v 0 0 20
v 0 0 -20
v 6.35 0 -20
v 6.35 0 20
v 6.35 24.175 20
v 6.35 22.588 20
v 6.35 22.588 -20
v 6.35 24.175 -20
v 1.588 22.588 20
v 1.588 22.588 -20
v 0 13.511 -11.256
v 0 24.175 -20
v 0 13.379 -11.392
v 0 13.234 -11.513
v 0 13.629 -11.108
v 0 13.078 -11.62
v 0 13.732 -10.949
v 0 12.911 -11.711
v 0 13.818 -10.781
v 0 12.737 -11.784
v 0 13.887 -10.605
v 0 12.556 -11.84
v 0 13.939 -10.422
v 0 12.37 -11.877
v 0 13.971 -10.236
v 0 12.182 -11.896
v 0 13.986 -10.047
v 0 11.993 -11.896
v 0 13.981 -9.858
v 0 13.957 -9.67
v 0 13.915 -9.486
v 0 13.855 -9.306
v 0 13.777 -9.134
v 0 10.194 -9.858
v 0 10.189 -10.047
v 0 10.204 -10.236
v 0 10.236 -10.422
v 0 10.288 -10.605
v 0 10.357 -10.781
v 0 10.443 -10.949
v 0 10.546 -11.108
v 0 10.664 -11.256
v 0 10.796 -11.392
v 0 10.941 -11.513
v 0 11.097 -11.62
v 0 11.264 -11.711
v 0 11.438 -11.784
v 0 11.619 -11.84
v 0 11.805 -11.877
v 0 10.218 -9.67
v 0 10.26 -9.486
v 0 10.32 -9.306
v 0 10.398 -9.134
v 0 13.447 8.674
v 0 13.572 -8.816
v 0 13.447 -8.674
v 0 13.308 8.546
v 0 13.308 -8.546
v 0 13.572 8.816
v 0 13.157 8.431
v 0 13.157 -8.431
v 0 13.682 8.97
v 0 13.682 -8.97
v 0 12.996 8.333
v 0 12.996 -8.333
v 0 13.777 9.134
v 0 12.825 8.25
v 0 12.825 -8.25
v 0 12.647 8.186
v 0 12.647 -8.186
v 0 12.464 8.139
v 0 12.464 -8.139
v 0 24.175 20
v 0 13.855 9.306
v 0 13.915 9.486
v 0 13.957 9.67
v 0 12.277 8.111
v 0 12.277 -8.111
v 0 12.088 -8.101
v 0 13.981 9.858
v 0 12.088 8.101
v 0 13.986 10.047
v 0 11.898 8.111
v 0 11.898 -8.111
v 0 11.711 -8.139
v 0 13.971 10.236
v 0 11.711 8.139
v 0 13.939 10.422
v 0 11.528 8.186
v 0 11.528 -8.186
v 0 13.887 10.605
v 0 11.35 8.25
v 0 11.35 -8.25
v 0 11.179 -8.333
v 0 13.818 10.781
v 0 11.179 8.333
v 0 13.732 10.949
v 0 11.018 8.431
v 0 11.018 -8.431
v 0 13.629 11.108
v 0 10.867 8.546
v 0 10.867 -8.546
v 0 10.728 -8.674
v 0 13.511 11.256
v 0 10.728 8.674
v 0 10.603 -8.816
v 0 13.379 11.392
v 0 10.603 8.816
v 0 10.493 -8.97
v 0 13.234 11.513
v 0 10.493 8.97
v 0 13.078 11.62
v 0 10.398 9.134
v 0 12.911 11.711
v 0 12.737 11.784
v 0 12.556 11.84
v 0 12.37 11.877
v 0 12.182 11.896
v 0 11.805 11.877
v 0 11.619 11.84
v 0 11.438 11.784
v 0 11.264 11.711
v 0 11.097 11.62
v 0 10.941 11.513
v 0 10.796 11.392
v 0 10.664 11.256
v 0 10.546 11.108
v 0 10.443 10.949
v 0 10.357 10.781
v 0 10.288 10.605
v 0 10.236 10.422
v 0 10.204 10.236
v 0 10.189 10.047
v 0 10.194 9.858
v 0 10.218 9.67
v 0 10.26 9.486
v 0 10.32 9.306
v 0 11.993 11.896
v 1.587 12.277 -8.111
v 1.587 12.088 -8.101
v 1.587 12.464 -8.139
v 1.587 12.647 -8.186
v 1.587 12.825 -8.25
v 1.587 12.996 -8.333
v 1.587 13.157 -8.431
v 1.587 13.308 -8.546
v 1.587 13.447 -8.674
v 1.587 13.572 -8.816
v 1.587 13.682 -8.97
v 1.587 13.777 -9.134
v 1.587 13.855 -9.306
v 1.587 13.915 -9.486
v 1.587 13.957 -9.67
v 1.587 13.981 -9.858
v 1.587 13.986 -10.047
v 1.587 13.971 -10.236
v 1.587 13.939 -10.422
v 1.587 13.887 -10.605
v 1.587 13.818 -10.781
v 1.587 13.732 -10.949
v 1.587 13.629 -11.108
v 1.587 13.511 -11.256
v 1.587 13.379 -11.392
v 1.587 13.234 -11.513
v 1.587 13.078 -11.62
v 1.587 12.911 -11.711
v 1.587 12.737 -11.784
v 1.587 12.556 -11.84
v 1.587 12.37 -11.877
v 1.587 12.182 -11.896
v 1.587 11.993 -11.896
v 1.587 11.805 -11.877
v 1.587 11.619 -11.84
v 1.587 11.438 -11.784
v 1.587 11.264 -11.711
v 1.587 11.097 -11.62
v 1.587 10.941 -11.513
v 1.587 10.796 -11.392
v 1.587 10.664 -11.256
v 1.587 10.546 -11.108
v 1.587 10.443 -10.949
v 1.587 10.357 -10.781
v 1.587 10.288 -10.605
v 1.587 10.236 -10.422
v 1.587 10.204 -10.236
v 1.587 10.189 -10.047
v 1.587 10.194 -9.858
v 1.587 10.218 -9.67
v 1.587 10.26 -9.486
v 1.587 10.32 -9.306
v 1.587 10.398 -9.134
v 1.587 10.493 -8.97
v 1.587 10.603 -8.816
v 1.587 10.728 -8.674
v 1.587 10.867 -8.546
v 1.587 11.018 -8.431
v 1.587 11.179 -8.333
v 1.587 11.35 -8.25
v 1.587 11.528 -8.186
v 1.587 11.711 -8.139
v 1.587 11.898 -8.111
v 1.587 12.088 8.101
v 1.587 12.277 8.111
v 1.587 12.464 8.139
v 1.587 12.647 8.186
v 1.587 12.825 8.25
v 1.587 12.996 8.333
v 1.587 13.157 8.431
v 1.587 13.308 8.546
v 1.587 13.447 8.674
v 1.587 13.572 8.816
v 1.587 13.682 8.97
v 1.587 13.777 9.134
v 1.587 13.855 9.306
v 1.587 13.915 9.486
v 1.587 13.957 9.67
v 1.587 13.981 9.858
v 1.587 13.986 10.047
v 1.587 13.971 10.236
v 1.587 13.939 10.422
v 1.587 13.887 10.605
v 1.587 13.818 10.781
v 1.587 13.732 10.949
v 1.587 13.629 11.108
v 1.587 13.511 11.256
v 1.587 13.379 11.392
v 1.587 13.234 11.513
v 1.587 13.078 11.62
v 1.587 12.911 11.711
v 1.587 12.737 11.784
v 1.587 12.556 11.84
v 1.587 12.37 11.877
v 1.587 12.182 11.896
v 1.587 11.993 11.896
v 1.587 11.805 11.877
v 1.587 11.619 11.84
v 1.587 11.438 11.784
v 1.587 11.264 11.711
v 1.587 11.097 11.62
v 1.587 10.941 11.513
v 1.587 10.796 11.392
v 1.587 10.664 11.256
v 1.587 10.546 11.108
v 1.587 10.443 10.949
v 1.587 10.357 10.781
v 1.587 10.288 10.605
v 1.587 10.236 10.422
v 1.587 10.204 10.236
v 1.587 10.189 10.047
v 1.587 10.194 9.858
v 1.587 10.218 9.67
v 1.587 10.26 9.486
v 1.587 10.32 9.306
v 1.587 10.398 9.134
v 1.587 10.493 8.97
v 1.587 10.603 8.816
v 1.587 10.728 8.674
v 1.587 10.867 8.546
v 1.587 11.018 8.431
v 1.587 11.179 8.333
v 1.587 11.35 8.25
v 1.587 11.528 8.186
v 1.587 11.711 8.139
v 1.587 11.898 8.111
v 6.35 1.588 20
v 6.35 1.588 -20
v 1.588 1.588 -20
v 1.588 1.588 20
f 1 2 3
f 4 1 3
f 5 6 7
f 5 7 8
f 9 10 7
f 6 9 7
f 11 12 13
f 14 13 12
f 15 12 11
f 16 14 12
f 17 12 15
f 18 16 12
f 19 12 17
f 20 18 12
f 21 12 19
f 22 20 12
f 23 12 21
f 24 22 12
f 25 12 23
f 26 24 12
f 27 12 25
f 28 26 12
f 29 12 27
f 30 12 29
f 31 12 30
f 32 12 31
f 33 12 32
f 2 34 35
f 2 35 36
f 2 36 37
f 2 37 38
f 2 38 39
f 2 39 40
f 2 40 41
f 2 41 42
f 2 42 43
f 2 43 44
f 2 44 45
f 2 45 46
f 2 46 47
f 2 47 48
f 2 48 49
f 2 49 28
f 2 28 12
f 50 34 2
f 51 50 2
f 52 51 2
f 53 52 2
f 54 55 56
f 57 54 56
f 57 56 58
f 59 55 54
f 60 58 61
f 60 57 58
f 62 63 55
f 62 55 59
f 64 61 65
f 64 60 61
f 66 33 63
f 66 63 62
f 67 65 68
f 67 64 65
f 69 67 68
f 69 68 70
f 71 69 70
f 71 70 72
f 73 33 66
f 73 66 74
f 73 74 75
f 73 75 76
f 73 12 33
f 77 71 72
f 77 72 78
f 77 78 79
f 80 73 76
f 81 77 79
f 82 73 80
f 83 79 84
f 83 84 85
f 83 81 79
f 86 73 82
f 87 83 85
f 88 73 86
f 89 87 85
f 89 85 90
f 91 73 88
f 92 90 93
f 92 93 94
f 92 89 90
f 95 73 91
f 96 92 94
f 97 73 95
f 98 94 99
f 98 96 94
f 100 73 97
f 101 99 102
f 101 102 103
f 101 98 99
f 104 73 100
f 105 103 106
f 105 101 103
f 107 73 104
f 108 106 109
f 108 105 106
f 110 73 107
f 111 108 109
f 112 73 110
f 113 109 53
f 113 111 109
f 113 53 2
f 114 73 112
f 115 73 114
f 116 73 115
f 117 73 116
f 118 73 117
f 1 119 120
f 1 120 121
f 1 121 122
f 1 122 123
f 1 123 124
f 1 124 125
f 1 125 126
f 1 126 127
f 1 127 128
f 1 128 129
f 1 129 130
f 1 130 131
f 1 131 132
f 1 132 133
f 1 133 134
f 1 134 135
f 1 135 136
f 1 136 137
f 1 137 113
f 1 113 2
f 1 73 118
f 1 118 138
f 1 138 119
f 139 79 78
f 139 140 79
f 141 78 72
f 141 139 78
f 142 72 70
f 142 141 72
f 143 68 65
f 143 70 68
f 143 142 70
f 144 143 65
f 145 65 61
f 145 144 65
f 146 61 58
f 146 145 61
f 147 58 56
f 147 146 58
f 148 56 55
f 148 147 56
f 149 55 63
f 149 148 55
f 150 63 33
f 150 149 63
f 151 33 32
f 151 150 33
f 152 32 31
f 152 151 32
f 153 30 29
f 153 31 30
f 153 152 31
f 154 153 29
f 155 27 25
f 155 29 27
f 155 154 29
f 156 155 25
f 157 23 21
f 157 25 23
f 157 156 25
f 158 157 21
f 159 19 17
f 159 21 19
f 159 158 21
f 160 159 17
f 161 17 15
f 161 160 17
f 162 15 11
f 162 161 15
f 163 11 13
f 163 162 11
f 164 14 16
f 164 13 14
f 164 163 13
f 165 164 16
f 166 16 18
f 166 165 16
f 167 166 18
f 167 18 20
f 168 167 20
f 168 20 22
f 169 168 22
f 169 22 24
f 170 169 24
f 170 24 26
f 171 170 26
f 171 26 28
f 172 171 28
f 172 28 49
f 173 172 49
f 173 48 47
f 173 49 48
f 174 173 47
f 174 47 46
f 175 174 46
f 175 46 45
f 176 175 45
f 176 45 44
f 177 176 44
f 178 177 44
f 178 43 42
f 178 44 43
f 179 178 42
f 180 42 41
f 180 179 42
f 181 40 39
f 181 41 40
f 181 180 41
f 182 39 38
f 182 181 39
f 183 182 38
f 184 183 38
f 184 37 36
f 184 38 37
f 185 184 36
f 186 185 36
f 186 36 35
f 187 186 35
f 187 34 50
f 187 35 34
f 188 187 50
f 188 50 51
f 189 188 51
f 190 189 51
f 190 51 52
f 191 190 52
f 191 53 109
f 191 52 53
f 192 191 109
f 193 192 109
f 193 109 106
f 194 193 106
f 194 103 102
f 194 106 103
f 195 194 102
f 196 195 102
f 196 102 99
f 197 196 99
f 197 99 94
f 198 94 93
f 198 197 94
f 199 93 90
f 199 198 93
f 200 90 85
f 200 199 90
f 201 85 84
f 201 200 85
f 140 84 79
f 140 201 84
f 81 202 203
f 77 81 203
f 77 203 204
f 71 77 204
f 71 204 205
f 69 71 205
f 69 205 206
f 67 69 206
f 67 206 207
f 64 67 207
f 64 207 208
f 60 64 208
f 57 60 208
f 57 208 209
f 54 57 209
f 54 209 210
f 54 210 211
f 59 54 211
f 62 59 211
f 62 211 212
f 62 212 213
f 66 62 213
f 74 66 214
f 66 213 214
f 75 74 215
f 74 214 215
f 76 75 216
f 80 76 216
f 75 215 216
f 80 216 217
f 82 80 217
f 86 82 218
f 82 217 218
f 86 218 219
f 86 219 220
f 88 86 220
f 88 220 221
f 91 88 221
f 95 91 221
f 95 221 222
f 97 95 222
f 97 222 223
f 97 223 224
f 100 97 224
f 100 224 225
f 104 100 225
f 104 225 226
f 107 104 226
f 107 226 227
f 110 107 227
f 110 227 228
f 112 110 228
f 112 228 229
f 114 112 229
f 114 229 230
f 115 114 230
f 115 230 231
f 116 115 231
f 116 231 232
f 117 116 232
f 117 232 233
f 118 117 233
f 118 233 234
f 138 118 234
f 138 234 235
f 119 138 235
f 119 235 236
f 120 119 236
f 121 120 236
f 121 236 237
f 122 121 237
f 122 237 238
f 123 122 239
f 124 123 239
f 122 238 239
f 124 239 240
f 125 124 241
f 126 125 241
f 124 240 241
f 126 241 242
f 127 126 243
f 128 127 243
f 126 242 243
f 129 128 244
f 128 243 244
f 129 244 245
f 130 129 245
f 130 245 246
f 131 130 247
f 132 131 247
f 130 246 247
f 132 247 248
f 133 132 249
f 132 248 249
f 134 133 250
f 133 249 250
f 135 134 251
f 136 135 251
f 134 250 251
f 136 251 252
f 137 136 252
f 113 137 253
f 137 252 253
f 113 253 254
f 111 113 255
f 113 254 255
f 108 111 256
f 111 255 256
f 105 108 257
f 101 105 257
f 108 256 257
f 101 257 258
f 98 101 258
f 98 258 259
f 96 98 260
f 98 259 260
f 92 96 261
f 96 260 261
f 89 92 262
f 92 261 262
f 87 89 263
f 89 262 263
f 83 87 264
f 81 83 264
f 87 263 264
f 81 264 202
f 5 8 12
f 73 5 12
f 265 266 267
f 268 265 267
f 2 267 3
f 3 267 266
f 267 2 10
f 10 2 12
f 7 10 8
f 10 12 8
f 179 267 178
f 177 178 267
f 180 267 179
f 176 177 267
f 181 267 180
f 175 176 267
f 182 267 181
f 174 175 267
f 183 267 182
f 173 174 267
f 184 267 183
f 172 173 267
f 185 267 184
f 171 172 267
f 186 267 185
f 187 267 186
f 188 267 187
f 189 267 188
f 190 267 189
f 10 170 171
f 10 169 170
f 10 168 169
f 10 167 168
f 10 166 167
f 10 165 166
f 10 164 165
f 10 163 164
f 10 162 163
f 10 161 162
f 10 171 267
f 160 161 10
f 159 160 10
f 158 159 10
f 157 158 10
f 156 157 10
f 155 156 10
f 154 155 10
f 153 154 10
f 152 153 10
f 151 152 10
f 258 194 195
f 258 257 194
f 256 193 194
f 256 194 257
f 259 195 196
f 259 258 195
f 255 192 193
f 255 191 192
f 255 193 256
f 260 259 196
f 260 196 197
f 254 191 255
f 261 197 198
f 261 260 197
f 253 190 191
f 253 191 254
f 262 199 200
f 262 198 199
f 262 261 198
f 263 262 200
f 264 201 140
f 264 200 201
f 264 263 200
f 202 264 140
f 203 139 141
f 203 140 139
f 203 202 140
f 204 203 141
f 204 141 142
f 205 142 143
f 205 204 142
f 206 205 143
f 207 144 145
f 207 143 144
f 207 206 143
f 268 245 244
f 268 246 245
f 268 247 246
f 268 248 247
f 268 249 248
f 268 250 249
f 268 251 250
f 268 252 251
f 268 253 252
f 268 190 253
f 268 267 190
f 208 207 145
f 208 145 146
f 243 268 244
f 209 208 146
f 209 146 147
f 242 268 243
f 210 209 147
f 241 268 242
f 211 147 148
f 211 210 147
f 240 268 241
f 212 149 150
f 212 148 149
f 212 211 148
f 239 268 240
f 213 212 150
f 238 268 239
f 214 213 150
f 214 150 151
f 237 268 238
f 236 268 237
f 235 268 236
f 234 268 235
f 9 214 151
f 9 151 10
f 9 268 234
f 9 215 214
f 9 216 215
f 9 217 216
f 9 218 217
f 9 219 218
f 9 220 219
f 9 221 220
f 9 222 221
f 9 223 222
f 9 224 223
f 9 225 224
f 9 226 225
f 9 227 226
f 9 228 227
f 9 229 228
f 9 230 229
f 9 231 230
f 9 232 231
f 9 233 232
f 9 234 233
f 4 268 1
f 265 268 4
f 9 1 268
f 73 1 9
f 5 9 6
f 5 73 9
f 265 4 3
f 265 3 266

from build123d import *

# Parameters (mm, degrees)
BOSS_EXTRUDE1_DEPTH   = 20
F_6_CLEARANCE_HOLE1_D = 3.7973


with BuildPart() as part:
    # Sketch1 → Boss-Extrude1 (new body)
    with BuildSketch(Plane.XY):
        Polygon((0, 0), (6.35, 0), (6.35, 1.5875), (1.5875, 1.5875), (1.5875, 22.5875), (6.35, 22.5875), (6.35, 24.175), (0, 24.175), align=None)
    boss_extrude1 = extrude(amount=BOSS_EXTRUDE1_DEPTH)

    # #6 Clearance Hole1 (through all)
    with Locations(Plane.ZY):
        with Locations((10, 12.0875)):
            f_6_clearance_hole1 = Hole(F_6_CLEARANCE_HOLE1_D / 2)

    # Mirror1: Boss-Extrude1, #6 Clearance Hole1 across plane
    add(boss_extrude1.mirror(Plane(origin=(0, 0, 0), x_dir=(1, 0, 0), z_dir=(0, 0, -1))))
    add(f_6_clearance_hole1.mirror(Plane(origin=(0, 0, 0), x_dir=(1, 0, 0), z_dir=(0, 0, -1))), mode=Mode.SUBTRACT)


solid = part.part
